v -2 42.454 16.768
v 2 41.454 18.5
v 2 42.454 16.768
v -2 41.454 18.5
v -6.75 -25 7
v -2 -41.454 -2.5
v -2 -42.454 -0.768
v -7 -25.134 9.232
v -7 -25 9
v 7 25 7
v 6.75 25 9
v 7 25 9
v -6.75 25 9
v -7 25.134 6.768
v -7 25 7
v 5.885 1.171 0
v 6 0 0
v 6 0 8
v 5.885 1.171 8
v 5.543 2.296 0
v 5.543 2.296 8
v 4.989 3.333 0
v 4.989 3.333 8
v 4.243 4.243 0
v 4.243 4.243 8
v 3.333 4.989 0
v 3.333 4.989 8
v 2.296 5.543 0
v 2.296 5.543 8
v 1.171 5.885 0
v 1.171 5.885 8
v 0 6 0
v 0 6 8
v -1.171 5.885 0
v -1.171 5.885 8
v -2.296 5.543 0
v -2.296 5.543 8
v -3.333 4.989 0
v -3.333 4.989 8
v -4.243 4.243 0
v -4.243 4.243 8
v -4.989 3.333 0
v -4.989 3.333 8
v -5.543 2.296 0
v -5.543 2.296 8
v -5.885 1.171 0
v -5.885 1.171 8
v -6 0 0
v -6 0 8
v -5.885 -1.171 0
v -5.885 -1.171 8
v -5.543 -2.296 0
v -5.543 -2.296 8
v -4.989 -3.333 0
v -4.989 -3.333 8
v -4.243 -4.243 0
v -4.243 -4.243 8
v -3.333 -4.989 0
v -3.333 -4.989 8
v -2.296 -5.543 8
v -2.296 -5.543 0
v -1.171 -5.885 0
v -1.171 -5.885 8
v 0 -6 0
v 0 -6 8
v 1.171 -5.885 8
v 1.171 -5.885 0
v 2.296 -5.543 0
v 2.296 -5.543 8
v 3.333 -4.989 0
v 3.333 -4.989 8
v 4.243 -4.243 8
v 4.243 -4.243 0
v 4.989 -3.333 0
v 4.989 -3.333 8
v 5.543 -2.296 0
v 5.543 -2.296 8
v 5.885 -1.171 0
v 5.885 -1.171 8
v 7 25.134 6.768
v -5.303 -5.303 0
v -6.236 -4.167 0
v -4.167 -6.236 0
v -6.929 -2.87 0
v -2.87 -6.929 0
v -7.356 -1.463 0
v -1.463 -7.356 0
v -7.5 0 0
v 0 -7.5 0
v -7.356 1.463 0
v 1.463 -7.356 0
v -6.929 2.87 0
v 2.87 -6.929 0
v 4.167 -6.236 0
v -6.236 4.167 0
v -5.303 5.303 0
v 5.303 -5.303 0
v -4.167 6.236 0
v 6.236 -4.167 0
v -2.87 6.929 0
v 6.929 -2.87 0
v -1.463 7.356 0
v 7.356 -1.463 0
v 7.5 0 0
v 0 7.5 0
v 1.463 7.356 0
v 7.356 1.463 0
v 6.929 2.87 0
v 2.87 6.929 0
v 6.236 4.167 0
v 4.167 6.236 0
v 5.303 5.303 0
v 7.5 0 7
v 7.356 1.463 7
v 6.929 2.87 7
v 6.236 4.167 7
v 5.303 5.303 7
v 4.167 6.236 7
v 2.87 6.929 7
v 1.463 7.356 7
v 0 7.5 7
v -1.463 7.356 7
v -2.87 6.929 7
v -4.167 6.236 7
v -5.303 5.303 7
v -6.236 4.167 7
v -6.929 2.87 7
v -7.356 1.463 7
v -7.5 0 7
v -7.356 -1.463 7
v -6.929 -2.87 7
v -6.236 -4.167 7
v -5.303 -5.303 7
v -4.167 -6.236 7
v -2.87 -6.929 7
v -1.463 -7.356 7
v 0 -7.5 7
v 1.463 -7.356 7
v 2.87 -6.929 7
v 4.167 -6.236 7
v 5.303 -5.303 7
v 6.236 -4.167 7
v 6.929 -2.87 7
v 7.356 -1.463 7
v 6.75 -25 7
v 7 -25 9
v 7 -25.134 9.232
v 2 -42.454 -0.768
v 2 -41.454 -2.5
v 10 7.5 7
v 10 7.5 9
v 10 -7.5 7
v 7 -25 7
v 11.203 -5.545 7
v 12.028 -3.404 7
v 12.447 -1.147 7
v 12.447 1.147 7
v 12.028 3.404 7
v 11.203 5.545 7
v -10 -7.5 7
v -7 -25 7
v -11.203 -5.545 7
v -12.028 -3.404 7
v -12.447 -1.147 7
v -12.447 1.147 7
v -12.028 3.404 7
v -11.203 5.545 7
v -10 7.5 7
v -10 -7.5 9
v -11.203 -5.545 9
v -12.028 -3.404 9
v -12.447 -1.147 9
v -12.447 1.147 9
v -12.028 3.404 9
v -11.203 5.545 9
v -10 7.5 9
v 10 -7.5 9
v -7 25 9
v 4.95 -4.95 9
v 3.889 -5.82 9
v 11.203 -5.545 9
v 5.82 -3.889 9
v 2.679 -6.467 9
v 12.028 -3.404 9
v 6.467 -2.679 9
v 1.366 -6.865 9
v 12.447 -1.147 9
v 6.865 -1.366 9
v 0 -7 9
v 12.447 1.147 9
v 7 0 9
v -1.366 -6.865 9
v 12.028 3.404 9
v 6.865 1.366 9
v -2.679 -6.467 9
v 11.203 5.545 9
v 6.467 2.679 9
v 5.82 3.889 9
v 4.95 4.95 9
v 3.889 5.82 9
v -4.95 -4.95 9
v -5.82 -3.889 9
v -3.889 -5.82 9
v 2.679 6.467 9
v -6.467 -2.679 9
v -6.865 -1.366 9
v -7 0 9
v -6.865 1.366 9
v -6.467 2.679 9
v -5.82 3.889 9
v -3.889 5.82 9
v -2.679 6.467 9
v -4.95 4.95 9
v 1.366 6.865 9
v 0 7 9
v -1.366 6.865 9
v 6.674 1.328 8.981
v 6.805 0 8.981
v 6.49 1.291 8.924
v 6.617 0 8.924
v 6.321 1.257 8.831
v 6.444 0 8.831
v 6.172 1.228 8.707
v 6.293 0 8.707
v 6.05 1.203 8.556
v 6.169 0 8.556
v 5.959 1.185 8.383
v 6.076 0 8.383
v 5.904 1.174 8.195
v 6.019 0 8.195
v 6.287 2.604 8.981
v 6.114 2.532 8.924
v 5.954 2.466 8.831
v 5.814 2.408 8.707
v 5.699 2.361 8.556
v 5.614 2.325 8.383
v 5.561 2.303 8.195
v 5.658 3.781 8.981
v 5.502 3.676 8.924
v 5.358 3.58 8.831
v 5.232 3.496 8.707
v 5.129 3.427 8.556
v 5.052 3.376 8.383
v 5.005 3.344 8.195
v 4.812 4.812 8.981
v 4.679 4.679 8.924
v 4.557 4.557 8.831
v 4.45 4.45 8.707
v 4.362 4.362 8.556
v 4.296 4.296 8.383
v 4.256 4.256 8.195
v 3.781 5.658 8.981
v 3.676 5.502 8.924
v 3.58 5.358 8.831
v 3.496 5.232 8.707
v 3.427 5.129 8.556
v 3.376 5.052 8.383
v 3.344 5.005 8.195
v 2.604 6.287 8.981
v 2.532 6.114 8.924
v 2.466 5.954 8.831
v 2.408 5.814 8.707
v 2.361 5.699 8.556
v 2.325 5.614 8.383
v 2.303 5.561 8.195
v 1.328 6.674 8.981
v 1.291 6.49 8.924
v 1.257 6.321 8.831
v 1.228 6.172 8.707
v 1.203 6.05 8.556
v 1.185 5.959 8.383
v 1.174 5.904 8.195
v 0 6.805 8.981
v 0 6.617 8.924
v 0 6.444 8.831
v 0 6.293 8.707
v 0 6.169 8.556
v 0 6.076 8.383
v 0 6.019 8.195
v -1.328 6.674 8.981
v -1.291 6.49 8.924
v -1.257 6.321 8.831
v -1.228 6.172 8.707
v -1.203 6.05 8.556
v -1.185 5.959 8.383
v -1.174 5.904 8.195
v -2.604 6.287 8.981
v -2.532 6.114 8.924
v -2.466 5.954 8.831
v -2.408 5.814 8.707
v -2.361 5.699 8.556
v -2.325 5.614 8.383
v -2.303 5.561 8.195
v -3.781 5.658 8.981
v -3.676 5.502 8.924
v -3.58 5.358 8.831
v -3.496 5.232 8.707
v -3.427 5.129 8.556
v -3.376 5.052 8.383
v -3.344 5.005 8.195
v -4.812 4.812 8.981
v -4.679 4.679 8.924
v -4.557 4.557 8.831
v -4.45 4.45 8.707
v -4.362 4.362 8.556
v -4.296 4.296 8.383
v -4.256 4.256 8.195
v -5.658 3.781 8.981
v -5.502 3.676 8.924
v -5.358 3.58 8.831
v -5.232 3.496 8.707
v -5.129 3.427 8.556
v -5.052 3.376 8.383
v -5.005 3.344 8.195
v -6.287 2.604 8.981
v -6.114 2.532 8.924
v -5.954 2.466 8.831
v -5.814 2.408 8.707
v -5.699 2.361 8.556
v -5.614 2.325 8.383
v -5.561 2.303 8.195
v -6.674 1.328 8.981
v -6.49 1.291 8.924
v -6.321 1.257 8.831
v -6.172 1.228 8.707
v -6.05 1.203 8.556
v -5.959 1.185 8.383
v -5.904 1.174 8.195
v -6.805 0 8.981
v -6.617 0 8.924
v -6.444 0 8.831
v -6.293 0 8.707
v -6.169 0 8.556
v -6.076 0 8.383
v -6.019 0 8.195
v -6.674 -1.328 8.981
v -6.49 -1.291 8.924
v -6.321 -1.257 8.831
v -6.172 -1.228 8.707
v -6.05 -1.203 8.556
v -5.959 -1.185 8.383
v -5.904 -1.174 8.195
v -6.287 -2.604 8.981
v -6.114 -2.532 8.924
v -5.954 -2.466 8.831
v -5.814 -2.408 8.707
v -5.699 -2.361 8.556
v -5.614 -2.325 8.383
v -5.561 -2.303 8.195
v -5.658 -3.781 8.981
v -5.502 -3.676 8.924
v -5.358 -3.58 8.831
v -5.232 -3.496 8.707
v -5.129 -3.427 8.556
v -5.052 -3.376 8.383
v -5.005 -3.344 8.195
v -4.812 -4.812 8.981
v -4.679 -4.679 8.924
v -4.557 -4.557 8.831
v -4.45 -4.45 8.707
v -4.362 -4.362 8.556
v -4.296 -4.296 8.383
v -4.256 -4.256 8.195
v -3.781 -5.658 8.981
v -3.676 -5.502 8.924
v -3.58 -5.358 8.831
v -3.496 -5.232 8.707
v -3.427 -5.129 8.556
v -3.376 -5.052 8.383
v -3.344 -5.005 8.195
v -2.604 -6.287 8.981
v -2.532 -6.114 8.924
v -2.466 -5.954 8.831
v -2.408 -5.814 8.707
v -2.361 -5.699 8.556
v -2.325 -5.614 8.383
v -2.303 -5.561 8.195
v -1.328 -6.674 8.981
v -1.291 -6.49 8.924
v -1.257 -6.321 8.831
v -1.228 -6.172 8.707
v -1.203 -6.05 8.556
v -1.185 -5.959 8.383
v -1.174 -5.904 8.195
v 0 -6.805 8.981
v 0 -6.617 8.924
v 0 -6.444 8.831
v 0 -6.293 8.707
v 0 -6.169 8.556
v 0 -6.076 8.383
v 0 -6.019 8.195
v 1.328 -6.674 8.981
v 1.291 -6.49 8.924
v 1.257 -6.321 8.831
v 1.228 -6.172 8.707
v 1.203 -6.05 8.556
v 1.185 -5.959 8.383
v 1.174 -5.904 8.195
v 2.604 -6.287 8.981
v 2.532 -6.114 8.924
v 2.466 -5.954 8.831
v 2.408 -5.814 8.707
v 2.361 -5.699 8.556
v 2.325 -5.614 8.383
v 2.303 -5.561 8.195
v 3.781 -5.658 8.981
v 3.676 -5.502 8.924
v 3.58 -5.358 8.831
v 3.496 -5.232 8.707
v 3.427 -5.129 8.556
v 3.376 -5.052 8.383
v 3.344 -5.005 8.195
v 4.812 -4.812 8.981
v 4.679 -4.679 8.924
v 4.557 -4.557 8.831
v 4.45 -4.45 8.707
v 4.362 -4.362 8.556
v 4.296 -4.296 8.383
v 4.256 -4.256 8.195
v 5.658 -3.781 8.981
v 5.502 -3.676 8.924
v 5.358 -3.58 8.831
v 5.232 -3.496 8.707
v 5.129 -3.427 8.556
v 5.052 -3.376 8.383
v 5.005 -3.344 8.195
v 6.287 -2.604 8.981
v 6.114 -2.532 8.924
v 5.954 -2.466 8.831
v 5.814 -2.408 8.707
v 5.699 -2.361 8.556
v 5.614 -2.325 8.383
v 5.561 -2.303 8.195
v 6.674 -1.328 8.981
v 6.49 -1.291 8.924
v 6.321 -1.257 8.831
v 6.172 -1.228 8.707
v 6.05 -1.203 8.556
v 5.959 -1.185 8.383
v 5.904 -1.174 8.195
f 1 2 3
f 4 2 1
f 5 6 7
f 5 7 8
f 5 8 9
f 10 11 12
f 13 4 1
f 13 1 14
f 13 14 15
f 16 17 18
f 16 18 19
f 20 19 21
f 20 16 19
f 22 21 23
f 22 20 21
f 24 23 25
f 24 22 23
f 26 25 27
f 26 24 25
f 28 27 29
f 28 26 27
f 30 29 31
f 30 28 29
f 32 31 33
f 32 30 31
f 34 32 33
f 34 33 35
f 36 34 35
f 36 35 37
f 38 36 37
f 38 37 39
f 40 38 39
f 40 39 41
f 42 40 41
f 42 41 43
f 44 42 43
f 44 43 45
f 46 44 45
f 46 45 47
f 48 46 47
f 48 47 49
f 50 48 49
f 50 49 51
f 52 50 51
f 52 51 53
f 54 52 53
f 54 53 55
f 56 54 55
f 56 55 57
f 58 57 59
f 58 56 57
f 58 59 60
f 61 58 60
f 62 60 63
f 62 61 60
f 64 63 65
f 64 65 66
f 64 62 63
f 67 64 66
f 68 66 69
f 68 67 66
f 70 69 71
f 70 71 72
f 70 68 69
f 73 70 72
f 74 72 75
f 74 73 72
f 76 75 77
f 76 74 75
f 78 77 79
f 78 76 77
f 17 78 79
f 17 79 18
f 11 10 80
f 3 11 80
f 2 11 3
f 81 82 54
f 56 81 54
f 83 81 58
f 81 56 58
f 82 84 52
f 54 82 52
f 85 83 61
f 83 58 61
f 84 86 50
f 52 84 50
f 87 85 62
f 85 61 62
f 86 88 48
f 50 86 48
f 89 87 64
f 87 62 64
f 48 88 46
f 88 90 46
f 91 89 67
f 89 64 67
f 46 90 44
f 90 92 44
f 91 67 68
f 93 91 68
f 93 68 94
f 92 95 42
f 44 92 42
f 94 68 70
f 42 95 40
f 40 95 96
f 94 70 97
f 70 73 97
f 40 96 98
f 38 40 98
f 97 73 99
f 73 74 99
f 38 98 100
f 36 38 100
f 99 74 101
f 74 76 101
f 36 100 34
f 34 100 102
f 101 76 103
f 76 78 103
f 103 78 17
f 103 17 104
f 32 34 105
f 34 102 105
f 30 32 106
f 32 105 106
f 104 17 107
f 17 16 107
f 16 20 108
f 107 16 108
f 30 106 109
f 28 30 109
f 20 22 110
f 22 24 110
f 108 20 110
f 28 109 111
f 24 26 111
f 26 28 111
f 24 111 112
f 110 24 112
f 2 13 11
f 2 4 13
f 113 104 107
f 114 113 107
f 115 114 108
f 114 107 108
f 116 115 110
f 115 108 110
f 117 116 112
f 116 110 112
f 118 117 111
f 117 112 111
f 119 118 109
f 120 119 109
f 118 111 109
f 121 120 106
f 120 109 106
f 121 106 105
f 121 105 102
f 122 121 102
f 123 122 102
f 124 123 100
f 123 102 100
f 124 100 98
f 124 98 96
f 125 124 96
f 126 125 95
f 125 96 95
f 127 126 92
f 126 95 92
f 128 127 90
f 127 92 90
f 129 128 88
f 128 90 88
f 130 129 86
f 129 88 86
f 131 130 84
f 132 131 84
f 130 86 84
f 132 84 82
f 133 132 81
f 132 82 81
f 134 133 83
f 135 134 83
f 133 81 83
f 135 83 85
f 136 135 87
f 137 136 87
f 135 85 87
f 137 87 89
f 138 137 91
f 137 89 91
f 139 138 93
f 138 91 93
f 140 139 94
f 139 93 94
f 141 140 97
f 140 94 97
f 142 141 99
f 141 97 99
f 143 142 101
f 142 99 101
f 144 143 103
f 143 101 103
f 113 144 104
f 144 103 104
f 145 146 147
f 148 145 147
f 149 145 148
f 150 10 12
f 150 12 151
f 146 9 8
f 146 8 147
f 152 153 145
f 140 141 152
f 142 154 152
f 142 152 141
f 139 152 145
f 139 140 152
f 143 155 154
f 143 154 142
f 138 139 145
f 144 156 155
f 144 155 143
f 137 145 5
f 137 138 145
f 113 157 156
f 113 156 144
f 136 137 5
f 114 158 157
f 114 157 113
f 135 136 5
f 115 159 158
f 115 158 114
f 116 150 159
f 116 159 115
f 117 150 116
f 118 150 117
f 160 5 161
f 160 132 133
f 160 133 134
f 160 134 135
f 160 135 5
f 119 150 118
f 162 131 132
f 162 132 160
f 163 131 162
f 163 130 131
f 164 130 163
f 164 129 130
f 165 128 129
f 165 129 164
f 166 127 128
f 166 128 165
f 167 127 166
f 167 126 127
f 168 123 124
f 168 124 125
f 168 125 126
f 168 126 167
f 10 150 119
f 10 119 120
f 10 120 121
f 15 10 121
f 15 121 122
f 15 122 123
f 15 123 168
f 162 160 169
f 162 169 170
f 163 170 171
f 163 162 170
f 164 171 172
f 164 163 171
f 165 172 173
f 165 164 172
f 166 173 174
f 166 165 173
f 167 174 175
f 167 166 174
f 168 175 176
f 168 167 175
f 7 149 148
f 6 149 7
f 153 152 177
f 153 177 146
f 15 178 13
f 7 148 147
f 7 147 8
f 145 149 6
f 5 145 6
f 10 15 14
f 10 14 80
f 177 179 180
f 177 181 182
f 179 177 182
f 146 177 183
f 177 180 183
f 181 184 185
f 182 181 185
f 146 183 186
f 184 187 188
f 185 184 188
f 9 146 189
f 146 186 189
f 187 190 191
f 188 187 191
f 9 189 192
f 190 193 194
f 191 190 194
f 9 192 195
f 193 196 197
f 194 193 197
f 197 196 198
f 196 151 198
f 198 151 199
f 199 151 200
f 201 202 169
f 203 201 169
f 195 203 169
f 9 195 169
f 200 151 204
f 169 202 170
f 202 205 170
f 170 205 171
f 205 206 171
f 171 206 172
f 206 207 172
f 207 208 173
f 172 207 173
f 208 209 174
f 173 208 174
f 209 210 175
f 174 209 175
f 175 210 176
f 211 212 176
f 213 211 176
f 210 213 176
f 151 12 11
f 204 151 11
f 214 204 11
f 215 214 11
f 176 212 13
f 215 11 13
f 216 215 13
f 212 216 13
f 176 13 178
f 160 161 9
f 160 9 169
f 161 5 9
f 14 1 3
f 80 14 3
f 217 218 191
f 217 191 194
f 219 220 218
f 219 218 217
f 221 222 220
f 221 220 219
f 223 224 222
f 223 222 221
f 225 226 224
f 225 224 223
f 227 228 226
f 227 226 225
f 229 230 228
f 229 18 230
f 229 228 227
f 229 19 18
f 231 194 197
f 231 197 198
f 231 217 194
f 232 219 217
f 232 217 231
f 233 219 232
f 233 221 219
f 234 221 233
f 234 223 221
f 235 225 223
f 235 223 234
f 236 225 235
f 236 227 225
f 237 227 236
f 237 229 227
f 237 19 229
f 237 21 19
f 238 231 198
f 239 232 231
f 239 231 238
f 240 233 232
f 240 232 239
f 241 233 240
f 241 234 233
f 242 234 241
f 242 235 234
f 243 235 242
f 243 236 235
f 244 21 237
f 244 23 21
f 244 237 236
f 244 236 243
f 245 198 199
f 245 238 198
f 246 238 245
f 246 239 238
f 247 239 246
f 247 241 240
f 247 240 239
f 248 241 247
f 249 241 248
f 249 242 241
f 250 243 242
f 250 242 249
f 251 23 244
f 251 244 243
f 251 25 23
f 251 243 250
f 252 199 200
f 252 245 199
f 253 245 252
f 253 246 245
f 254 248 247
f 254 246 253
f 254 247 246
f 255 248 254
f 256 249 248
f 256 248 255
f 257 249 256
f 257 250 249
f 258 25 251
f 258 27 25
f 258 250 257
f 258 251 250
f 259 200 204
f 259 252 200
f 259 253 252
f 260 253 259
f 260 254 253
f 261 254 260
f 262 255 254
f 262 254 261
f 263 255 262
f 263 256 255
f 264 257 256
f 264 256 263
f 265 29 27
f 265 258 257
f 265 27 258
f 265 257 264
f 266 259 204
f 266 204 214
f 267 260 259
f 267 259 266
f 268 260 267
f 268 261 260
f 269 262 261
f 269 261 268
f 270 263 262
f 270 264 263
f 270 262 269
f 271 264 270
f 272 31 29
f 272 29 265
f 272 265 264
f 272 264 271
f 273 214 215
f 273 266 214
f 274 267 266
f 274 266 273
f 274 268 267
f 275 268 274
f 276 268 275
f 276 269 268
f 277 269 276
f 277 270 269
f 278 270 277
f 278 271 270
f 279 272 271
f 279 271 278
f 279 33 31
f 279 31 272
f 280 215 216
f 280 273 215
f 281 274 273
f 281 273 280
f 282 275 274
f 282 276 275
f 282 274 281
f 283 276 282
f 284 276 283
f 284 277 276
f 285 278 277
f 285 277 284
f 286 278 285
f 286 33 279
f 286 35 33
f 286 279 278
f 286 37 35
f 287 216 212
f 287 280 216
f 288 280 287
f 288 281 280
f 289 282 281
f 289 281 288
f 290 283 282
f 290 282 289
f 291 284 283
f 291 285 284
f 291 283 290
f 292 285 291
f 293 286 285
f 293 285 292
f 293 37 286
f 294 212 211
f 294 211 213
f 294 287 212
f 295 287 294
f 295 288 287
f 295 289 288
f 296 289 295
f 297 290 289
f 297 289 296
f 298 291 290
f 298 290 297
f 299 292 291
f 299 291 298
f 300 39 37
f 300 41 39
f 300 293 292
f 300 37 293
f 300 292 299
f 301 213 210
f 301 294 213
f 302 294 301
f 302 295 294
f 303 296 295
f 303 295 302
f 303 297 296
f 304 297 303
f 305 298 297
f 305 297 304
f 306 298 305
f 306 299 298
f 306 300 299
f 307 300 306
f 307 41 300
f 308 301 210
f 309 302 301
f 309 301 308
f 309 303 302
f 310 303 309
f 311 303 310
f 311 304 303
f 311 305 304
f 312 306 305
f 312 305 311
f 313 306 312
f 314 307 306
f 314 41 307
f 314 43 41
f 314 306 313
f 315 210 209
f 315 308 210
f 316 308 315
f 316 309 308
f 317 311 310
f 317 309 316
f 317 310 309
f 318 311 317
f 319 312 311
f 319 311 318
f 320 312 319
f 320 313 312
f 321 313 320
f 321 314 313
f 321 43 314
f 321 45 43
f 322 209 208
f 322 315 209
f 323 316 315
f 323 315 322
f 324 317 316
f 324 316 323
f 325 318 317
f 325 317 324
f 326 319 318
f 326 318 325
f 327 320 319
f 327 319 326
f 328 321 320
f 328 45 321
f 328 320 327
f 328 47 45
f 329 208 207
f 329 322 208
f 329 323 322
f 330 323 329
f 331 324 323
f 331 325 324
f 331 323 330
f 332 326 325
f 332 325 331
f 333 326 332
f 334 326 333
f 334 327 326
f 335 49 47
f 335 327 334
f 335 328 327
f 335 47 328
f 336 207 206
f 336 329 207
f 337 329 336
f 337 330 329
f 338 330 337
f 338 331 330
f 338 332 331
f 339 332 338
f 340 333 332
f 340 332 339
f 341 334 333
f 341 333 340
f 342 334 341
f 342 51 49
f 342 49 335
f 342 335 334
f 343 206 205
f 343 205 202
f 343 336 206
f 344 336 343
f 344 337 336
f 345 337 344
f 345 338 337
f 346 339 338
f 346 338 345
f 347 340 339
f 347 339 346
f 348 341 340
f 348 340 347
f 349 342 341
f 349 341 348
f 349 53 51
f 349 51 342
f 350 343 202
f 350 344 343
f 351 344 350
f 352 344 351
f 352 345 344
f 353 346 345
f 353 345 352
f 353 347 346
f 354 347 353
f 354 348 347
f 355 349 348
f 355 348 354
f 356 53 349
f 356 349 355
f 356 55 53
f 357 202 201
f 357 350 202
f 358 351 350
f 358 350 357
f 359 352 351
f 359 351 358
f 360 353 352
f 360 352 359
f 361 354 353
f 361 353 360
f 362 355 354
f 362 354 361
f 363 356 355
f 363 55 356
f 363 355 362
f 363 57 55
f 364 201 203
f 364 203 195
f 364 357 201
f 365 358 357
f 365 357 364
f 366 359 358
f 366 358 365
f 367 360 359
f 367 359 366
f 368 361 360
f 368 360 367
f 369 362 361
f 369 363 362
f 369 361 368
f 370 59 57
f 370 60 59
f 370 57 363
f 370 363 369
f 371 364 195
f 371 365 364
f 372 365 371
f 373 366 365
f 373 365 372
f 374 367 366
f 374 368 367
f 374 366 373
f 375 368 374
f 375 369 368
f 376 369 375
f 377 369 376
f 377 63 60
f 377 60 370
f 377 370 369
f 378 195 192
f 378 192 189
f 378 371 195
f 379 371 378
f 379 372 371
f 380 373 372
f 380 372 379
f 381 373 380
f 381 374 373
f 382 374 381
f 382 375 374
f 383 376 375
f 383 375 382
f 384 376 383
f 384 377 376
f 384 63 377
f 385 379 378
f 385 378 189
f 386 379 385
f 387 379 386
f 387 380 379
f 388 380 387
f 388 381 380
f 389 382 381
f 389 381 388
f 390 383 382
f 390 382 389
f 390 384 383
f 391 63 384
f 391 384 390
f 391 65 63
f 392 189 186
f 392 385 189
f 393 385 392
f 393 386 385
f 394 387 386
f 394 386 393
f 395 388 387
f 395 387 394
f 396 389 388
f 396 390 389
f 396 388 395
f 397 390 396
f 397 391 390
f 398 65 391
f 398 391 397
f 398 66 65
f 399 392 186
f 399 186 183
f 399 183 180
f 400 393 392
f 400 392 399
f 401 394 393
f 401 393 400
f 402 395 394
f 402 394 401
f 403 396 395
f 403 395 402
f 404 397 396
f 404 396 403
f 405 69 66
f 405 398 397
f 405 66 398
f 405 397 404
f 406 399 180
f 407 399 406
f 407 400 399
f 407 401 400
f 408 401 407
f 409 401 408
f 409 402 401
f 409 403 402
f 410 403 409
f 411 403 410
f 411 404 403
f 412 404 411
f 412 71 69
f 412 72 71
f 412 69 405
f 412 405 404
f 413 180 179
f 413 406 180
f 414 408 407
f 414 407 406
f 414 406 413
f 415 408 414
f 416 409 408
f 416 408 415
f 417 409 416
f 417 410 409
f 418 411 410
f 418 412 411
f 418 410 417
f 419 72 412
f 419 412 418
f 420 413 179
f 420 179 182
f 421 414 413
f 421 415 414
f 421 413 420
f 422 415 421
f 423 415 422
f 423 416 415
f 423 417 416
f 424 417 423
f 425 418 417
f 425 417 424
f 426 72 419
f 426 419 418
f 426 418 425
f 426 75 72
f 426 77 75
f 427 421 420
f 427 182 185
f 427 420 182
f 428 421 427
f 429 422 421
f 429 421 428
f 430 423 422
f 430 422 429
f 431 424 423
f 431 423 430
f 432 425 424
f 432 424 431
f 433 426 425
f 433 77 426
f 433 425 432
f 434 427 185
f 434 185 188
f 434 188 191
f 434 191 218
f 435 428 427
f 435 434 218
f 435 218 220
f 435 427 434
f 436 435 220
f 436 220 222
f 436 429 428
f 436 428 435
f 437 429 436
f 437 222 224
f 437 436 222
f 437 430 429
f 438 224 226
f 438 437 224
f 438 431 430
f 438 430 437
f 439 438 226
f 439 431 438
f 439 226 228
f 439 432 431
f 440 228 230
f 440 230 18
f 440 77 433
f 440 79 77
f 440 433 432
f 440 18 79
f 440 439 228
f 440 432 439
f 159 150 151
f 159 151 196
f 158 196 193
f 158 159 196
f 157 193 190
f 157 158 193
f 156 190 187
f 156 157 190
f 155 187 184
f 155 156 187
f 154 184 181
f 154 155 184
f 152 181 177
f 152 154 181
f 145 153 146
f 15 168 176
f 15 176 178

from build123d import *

# Parameters (mm, degrees)
ESQUISSE1_R          = 7.5
ESQUISSE1_R_2        = 6
BASE_EXTRUSION_DEPTH = 7
ESQUISSE2_R          = 6
BOSS_EXTRU_1_DEPTH   = 2
CONG_1_R             = 1
BOSS_EXTRU_2_DEPTH   = 2
BOSS_EXTRU_3_DEPTH   = 2


with BuildPart() as part:
    # Esquisse1 → Base-Extrusion (new body)
    with BuildSketch(Plane.XY):
        Circle(ESQUISSE1_R)
        Circle(ESQUISSE1_R_2, mode=Mode.SUBTRACT)
    extrude(amount=BASE_EXTRUSION_DEPTH)

    # Esquisse2 → Boss.-Extru.1 (add)
    with BuildSketch(Plane.XY.offset(7)):
        with BuildLine():
            Line((-7, 25), (7, 25))
            Line((7, 25), (10, 7.5))
            ThreePointArc((10, 7.5), (12.5, 0), (10, -7.5))
            Line((10, -7.5), (7, -25))
            Line((7, -25), (-7, -25))
            Line((-7, -25), (-10, -7.5))
            ThreePointArc((-10, -7.5), (-12.5, 0), (-10, 7.5))
            Line((-10, 7.5), (-7, 25))
        make_face()
        Circle(ESQUISSE2_R, mode=Mode.SUBTRACT)
    extrude(amount=BOSS_EXTRU_1_DEPTH)

    # Congé1
    cong_1_edges = [part.edges().sort_by_distance(p)[0] for p in [
        (-6, 0, 9),
    ]]
    fillet(cong_1_edges, radius=CONG_1_R)

    # Esquisse3 → Boss.-Extru.2 (add)
    with BuildSketch(Plane(origin=(0, 2.352885683, -4.075317547), x_dir=(-1, 0, 0), z_dir=(0, 0.499999999999998, -0.8660254037844398))):
        Polygon((-7, 25.150635095), (-2, 45.150635095), (2, 45.150635095), (7, 25.150635095), align=None)
    extrude(amount=BOSS_EXTRU_2_DEPTH)

    # Esquisse4 → Boss.-Extru.3 (add)
    with BuildSketch(Plane(origin=(0, -9.281088913, 16.075317547), x_dir=(1, 0, 0), z_dir=(0, -0.49999999999999806, 0.8660254037844398))):
        Polygon((-7, -17.150635095), (7, -17.150635095), (2, -37.150635095), (-2, -37.150635095), align=None)
    extrude(amount=BOSS_EXTRU_3_DEPTH)


solid = part.part
